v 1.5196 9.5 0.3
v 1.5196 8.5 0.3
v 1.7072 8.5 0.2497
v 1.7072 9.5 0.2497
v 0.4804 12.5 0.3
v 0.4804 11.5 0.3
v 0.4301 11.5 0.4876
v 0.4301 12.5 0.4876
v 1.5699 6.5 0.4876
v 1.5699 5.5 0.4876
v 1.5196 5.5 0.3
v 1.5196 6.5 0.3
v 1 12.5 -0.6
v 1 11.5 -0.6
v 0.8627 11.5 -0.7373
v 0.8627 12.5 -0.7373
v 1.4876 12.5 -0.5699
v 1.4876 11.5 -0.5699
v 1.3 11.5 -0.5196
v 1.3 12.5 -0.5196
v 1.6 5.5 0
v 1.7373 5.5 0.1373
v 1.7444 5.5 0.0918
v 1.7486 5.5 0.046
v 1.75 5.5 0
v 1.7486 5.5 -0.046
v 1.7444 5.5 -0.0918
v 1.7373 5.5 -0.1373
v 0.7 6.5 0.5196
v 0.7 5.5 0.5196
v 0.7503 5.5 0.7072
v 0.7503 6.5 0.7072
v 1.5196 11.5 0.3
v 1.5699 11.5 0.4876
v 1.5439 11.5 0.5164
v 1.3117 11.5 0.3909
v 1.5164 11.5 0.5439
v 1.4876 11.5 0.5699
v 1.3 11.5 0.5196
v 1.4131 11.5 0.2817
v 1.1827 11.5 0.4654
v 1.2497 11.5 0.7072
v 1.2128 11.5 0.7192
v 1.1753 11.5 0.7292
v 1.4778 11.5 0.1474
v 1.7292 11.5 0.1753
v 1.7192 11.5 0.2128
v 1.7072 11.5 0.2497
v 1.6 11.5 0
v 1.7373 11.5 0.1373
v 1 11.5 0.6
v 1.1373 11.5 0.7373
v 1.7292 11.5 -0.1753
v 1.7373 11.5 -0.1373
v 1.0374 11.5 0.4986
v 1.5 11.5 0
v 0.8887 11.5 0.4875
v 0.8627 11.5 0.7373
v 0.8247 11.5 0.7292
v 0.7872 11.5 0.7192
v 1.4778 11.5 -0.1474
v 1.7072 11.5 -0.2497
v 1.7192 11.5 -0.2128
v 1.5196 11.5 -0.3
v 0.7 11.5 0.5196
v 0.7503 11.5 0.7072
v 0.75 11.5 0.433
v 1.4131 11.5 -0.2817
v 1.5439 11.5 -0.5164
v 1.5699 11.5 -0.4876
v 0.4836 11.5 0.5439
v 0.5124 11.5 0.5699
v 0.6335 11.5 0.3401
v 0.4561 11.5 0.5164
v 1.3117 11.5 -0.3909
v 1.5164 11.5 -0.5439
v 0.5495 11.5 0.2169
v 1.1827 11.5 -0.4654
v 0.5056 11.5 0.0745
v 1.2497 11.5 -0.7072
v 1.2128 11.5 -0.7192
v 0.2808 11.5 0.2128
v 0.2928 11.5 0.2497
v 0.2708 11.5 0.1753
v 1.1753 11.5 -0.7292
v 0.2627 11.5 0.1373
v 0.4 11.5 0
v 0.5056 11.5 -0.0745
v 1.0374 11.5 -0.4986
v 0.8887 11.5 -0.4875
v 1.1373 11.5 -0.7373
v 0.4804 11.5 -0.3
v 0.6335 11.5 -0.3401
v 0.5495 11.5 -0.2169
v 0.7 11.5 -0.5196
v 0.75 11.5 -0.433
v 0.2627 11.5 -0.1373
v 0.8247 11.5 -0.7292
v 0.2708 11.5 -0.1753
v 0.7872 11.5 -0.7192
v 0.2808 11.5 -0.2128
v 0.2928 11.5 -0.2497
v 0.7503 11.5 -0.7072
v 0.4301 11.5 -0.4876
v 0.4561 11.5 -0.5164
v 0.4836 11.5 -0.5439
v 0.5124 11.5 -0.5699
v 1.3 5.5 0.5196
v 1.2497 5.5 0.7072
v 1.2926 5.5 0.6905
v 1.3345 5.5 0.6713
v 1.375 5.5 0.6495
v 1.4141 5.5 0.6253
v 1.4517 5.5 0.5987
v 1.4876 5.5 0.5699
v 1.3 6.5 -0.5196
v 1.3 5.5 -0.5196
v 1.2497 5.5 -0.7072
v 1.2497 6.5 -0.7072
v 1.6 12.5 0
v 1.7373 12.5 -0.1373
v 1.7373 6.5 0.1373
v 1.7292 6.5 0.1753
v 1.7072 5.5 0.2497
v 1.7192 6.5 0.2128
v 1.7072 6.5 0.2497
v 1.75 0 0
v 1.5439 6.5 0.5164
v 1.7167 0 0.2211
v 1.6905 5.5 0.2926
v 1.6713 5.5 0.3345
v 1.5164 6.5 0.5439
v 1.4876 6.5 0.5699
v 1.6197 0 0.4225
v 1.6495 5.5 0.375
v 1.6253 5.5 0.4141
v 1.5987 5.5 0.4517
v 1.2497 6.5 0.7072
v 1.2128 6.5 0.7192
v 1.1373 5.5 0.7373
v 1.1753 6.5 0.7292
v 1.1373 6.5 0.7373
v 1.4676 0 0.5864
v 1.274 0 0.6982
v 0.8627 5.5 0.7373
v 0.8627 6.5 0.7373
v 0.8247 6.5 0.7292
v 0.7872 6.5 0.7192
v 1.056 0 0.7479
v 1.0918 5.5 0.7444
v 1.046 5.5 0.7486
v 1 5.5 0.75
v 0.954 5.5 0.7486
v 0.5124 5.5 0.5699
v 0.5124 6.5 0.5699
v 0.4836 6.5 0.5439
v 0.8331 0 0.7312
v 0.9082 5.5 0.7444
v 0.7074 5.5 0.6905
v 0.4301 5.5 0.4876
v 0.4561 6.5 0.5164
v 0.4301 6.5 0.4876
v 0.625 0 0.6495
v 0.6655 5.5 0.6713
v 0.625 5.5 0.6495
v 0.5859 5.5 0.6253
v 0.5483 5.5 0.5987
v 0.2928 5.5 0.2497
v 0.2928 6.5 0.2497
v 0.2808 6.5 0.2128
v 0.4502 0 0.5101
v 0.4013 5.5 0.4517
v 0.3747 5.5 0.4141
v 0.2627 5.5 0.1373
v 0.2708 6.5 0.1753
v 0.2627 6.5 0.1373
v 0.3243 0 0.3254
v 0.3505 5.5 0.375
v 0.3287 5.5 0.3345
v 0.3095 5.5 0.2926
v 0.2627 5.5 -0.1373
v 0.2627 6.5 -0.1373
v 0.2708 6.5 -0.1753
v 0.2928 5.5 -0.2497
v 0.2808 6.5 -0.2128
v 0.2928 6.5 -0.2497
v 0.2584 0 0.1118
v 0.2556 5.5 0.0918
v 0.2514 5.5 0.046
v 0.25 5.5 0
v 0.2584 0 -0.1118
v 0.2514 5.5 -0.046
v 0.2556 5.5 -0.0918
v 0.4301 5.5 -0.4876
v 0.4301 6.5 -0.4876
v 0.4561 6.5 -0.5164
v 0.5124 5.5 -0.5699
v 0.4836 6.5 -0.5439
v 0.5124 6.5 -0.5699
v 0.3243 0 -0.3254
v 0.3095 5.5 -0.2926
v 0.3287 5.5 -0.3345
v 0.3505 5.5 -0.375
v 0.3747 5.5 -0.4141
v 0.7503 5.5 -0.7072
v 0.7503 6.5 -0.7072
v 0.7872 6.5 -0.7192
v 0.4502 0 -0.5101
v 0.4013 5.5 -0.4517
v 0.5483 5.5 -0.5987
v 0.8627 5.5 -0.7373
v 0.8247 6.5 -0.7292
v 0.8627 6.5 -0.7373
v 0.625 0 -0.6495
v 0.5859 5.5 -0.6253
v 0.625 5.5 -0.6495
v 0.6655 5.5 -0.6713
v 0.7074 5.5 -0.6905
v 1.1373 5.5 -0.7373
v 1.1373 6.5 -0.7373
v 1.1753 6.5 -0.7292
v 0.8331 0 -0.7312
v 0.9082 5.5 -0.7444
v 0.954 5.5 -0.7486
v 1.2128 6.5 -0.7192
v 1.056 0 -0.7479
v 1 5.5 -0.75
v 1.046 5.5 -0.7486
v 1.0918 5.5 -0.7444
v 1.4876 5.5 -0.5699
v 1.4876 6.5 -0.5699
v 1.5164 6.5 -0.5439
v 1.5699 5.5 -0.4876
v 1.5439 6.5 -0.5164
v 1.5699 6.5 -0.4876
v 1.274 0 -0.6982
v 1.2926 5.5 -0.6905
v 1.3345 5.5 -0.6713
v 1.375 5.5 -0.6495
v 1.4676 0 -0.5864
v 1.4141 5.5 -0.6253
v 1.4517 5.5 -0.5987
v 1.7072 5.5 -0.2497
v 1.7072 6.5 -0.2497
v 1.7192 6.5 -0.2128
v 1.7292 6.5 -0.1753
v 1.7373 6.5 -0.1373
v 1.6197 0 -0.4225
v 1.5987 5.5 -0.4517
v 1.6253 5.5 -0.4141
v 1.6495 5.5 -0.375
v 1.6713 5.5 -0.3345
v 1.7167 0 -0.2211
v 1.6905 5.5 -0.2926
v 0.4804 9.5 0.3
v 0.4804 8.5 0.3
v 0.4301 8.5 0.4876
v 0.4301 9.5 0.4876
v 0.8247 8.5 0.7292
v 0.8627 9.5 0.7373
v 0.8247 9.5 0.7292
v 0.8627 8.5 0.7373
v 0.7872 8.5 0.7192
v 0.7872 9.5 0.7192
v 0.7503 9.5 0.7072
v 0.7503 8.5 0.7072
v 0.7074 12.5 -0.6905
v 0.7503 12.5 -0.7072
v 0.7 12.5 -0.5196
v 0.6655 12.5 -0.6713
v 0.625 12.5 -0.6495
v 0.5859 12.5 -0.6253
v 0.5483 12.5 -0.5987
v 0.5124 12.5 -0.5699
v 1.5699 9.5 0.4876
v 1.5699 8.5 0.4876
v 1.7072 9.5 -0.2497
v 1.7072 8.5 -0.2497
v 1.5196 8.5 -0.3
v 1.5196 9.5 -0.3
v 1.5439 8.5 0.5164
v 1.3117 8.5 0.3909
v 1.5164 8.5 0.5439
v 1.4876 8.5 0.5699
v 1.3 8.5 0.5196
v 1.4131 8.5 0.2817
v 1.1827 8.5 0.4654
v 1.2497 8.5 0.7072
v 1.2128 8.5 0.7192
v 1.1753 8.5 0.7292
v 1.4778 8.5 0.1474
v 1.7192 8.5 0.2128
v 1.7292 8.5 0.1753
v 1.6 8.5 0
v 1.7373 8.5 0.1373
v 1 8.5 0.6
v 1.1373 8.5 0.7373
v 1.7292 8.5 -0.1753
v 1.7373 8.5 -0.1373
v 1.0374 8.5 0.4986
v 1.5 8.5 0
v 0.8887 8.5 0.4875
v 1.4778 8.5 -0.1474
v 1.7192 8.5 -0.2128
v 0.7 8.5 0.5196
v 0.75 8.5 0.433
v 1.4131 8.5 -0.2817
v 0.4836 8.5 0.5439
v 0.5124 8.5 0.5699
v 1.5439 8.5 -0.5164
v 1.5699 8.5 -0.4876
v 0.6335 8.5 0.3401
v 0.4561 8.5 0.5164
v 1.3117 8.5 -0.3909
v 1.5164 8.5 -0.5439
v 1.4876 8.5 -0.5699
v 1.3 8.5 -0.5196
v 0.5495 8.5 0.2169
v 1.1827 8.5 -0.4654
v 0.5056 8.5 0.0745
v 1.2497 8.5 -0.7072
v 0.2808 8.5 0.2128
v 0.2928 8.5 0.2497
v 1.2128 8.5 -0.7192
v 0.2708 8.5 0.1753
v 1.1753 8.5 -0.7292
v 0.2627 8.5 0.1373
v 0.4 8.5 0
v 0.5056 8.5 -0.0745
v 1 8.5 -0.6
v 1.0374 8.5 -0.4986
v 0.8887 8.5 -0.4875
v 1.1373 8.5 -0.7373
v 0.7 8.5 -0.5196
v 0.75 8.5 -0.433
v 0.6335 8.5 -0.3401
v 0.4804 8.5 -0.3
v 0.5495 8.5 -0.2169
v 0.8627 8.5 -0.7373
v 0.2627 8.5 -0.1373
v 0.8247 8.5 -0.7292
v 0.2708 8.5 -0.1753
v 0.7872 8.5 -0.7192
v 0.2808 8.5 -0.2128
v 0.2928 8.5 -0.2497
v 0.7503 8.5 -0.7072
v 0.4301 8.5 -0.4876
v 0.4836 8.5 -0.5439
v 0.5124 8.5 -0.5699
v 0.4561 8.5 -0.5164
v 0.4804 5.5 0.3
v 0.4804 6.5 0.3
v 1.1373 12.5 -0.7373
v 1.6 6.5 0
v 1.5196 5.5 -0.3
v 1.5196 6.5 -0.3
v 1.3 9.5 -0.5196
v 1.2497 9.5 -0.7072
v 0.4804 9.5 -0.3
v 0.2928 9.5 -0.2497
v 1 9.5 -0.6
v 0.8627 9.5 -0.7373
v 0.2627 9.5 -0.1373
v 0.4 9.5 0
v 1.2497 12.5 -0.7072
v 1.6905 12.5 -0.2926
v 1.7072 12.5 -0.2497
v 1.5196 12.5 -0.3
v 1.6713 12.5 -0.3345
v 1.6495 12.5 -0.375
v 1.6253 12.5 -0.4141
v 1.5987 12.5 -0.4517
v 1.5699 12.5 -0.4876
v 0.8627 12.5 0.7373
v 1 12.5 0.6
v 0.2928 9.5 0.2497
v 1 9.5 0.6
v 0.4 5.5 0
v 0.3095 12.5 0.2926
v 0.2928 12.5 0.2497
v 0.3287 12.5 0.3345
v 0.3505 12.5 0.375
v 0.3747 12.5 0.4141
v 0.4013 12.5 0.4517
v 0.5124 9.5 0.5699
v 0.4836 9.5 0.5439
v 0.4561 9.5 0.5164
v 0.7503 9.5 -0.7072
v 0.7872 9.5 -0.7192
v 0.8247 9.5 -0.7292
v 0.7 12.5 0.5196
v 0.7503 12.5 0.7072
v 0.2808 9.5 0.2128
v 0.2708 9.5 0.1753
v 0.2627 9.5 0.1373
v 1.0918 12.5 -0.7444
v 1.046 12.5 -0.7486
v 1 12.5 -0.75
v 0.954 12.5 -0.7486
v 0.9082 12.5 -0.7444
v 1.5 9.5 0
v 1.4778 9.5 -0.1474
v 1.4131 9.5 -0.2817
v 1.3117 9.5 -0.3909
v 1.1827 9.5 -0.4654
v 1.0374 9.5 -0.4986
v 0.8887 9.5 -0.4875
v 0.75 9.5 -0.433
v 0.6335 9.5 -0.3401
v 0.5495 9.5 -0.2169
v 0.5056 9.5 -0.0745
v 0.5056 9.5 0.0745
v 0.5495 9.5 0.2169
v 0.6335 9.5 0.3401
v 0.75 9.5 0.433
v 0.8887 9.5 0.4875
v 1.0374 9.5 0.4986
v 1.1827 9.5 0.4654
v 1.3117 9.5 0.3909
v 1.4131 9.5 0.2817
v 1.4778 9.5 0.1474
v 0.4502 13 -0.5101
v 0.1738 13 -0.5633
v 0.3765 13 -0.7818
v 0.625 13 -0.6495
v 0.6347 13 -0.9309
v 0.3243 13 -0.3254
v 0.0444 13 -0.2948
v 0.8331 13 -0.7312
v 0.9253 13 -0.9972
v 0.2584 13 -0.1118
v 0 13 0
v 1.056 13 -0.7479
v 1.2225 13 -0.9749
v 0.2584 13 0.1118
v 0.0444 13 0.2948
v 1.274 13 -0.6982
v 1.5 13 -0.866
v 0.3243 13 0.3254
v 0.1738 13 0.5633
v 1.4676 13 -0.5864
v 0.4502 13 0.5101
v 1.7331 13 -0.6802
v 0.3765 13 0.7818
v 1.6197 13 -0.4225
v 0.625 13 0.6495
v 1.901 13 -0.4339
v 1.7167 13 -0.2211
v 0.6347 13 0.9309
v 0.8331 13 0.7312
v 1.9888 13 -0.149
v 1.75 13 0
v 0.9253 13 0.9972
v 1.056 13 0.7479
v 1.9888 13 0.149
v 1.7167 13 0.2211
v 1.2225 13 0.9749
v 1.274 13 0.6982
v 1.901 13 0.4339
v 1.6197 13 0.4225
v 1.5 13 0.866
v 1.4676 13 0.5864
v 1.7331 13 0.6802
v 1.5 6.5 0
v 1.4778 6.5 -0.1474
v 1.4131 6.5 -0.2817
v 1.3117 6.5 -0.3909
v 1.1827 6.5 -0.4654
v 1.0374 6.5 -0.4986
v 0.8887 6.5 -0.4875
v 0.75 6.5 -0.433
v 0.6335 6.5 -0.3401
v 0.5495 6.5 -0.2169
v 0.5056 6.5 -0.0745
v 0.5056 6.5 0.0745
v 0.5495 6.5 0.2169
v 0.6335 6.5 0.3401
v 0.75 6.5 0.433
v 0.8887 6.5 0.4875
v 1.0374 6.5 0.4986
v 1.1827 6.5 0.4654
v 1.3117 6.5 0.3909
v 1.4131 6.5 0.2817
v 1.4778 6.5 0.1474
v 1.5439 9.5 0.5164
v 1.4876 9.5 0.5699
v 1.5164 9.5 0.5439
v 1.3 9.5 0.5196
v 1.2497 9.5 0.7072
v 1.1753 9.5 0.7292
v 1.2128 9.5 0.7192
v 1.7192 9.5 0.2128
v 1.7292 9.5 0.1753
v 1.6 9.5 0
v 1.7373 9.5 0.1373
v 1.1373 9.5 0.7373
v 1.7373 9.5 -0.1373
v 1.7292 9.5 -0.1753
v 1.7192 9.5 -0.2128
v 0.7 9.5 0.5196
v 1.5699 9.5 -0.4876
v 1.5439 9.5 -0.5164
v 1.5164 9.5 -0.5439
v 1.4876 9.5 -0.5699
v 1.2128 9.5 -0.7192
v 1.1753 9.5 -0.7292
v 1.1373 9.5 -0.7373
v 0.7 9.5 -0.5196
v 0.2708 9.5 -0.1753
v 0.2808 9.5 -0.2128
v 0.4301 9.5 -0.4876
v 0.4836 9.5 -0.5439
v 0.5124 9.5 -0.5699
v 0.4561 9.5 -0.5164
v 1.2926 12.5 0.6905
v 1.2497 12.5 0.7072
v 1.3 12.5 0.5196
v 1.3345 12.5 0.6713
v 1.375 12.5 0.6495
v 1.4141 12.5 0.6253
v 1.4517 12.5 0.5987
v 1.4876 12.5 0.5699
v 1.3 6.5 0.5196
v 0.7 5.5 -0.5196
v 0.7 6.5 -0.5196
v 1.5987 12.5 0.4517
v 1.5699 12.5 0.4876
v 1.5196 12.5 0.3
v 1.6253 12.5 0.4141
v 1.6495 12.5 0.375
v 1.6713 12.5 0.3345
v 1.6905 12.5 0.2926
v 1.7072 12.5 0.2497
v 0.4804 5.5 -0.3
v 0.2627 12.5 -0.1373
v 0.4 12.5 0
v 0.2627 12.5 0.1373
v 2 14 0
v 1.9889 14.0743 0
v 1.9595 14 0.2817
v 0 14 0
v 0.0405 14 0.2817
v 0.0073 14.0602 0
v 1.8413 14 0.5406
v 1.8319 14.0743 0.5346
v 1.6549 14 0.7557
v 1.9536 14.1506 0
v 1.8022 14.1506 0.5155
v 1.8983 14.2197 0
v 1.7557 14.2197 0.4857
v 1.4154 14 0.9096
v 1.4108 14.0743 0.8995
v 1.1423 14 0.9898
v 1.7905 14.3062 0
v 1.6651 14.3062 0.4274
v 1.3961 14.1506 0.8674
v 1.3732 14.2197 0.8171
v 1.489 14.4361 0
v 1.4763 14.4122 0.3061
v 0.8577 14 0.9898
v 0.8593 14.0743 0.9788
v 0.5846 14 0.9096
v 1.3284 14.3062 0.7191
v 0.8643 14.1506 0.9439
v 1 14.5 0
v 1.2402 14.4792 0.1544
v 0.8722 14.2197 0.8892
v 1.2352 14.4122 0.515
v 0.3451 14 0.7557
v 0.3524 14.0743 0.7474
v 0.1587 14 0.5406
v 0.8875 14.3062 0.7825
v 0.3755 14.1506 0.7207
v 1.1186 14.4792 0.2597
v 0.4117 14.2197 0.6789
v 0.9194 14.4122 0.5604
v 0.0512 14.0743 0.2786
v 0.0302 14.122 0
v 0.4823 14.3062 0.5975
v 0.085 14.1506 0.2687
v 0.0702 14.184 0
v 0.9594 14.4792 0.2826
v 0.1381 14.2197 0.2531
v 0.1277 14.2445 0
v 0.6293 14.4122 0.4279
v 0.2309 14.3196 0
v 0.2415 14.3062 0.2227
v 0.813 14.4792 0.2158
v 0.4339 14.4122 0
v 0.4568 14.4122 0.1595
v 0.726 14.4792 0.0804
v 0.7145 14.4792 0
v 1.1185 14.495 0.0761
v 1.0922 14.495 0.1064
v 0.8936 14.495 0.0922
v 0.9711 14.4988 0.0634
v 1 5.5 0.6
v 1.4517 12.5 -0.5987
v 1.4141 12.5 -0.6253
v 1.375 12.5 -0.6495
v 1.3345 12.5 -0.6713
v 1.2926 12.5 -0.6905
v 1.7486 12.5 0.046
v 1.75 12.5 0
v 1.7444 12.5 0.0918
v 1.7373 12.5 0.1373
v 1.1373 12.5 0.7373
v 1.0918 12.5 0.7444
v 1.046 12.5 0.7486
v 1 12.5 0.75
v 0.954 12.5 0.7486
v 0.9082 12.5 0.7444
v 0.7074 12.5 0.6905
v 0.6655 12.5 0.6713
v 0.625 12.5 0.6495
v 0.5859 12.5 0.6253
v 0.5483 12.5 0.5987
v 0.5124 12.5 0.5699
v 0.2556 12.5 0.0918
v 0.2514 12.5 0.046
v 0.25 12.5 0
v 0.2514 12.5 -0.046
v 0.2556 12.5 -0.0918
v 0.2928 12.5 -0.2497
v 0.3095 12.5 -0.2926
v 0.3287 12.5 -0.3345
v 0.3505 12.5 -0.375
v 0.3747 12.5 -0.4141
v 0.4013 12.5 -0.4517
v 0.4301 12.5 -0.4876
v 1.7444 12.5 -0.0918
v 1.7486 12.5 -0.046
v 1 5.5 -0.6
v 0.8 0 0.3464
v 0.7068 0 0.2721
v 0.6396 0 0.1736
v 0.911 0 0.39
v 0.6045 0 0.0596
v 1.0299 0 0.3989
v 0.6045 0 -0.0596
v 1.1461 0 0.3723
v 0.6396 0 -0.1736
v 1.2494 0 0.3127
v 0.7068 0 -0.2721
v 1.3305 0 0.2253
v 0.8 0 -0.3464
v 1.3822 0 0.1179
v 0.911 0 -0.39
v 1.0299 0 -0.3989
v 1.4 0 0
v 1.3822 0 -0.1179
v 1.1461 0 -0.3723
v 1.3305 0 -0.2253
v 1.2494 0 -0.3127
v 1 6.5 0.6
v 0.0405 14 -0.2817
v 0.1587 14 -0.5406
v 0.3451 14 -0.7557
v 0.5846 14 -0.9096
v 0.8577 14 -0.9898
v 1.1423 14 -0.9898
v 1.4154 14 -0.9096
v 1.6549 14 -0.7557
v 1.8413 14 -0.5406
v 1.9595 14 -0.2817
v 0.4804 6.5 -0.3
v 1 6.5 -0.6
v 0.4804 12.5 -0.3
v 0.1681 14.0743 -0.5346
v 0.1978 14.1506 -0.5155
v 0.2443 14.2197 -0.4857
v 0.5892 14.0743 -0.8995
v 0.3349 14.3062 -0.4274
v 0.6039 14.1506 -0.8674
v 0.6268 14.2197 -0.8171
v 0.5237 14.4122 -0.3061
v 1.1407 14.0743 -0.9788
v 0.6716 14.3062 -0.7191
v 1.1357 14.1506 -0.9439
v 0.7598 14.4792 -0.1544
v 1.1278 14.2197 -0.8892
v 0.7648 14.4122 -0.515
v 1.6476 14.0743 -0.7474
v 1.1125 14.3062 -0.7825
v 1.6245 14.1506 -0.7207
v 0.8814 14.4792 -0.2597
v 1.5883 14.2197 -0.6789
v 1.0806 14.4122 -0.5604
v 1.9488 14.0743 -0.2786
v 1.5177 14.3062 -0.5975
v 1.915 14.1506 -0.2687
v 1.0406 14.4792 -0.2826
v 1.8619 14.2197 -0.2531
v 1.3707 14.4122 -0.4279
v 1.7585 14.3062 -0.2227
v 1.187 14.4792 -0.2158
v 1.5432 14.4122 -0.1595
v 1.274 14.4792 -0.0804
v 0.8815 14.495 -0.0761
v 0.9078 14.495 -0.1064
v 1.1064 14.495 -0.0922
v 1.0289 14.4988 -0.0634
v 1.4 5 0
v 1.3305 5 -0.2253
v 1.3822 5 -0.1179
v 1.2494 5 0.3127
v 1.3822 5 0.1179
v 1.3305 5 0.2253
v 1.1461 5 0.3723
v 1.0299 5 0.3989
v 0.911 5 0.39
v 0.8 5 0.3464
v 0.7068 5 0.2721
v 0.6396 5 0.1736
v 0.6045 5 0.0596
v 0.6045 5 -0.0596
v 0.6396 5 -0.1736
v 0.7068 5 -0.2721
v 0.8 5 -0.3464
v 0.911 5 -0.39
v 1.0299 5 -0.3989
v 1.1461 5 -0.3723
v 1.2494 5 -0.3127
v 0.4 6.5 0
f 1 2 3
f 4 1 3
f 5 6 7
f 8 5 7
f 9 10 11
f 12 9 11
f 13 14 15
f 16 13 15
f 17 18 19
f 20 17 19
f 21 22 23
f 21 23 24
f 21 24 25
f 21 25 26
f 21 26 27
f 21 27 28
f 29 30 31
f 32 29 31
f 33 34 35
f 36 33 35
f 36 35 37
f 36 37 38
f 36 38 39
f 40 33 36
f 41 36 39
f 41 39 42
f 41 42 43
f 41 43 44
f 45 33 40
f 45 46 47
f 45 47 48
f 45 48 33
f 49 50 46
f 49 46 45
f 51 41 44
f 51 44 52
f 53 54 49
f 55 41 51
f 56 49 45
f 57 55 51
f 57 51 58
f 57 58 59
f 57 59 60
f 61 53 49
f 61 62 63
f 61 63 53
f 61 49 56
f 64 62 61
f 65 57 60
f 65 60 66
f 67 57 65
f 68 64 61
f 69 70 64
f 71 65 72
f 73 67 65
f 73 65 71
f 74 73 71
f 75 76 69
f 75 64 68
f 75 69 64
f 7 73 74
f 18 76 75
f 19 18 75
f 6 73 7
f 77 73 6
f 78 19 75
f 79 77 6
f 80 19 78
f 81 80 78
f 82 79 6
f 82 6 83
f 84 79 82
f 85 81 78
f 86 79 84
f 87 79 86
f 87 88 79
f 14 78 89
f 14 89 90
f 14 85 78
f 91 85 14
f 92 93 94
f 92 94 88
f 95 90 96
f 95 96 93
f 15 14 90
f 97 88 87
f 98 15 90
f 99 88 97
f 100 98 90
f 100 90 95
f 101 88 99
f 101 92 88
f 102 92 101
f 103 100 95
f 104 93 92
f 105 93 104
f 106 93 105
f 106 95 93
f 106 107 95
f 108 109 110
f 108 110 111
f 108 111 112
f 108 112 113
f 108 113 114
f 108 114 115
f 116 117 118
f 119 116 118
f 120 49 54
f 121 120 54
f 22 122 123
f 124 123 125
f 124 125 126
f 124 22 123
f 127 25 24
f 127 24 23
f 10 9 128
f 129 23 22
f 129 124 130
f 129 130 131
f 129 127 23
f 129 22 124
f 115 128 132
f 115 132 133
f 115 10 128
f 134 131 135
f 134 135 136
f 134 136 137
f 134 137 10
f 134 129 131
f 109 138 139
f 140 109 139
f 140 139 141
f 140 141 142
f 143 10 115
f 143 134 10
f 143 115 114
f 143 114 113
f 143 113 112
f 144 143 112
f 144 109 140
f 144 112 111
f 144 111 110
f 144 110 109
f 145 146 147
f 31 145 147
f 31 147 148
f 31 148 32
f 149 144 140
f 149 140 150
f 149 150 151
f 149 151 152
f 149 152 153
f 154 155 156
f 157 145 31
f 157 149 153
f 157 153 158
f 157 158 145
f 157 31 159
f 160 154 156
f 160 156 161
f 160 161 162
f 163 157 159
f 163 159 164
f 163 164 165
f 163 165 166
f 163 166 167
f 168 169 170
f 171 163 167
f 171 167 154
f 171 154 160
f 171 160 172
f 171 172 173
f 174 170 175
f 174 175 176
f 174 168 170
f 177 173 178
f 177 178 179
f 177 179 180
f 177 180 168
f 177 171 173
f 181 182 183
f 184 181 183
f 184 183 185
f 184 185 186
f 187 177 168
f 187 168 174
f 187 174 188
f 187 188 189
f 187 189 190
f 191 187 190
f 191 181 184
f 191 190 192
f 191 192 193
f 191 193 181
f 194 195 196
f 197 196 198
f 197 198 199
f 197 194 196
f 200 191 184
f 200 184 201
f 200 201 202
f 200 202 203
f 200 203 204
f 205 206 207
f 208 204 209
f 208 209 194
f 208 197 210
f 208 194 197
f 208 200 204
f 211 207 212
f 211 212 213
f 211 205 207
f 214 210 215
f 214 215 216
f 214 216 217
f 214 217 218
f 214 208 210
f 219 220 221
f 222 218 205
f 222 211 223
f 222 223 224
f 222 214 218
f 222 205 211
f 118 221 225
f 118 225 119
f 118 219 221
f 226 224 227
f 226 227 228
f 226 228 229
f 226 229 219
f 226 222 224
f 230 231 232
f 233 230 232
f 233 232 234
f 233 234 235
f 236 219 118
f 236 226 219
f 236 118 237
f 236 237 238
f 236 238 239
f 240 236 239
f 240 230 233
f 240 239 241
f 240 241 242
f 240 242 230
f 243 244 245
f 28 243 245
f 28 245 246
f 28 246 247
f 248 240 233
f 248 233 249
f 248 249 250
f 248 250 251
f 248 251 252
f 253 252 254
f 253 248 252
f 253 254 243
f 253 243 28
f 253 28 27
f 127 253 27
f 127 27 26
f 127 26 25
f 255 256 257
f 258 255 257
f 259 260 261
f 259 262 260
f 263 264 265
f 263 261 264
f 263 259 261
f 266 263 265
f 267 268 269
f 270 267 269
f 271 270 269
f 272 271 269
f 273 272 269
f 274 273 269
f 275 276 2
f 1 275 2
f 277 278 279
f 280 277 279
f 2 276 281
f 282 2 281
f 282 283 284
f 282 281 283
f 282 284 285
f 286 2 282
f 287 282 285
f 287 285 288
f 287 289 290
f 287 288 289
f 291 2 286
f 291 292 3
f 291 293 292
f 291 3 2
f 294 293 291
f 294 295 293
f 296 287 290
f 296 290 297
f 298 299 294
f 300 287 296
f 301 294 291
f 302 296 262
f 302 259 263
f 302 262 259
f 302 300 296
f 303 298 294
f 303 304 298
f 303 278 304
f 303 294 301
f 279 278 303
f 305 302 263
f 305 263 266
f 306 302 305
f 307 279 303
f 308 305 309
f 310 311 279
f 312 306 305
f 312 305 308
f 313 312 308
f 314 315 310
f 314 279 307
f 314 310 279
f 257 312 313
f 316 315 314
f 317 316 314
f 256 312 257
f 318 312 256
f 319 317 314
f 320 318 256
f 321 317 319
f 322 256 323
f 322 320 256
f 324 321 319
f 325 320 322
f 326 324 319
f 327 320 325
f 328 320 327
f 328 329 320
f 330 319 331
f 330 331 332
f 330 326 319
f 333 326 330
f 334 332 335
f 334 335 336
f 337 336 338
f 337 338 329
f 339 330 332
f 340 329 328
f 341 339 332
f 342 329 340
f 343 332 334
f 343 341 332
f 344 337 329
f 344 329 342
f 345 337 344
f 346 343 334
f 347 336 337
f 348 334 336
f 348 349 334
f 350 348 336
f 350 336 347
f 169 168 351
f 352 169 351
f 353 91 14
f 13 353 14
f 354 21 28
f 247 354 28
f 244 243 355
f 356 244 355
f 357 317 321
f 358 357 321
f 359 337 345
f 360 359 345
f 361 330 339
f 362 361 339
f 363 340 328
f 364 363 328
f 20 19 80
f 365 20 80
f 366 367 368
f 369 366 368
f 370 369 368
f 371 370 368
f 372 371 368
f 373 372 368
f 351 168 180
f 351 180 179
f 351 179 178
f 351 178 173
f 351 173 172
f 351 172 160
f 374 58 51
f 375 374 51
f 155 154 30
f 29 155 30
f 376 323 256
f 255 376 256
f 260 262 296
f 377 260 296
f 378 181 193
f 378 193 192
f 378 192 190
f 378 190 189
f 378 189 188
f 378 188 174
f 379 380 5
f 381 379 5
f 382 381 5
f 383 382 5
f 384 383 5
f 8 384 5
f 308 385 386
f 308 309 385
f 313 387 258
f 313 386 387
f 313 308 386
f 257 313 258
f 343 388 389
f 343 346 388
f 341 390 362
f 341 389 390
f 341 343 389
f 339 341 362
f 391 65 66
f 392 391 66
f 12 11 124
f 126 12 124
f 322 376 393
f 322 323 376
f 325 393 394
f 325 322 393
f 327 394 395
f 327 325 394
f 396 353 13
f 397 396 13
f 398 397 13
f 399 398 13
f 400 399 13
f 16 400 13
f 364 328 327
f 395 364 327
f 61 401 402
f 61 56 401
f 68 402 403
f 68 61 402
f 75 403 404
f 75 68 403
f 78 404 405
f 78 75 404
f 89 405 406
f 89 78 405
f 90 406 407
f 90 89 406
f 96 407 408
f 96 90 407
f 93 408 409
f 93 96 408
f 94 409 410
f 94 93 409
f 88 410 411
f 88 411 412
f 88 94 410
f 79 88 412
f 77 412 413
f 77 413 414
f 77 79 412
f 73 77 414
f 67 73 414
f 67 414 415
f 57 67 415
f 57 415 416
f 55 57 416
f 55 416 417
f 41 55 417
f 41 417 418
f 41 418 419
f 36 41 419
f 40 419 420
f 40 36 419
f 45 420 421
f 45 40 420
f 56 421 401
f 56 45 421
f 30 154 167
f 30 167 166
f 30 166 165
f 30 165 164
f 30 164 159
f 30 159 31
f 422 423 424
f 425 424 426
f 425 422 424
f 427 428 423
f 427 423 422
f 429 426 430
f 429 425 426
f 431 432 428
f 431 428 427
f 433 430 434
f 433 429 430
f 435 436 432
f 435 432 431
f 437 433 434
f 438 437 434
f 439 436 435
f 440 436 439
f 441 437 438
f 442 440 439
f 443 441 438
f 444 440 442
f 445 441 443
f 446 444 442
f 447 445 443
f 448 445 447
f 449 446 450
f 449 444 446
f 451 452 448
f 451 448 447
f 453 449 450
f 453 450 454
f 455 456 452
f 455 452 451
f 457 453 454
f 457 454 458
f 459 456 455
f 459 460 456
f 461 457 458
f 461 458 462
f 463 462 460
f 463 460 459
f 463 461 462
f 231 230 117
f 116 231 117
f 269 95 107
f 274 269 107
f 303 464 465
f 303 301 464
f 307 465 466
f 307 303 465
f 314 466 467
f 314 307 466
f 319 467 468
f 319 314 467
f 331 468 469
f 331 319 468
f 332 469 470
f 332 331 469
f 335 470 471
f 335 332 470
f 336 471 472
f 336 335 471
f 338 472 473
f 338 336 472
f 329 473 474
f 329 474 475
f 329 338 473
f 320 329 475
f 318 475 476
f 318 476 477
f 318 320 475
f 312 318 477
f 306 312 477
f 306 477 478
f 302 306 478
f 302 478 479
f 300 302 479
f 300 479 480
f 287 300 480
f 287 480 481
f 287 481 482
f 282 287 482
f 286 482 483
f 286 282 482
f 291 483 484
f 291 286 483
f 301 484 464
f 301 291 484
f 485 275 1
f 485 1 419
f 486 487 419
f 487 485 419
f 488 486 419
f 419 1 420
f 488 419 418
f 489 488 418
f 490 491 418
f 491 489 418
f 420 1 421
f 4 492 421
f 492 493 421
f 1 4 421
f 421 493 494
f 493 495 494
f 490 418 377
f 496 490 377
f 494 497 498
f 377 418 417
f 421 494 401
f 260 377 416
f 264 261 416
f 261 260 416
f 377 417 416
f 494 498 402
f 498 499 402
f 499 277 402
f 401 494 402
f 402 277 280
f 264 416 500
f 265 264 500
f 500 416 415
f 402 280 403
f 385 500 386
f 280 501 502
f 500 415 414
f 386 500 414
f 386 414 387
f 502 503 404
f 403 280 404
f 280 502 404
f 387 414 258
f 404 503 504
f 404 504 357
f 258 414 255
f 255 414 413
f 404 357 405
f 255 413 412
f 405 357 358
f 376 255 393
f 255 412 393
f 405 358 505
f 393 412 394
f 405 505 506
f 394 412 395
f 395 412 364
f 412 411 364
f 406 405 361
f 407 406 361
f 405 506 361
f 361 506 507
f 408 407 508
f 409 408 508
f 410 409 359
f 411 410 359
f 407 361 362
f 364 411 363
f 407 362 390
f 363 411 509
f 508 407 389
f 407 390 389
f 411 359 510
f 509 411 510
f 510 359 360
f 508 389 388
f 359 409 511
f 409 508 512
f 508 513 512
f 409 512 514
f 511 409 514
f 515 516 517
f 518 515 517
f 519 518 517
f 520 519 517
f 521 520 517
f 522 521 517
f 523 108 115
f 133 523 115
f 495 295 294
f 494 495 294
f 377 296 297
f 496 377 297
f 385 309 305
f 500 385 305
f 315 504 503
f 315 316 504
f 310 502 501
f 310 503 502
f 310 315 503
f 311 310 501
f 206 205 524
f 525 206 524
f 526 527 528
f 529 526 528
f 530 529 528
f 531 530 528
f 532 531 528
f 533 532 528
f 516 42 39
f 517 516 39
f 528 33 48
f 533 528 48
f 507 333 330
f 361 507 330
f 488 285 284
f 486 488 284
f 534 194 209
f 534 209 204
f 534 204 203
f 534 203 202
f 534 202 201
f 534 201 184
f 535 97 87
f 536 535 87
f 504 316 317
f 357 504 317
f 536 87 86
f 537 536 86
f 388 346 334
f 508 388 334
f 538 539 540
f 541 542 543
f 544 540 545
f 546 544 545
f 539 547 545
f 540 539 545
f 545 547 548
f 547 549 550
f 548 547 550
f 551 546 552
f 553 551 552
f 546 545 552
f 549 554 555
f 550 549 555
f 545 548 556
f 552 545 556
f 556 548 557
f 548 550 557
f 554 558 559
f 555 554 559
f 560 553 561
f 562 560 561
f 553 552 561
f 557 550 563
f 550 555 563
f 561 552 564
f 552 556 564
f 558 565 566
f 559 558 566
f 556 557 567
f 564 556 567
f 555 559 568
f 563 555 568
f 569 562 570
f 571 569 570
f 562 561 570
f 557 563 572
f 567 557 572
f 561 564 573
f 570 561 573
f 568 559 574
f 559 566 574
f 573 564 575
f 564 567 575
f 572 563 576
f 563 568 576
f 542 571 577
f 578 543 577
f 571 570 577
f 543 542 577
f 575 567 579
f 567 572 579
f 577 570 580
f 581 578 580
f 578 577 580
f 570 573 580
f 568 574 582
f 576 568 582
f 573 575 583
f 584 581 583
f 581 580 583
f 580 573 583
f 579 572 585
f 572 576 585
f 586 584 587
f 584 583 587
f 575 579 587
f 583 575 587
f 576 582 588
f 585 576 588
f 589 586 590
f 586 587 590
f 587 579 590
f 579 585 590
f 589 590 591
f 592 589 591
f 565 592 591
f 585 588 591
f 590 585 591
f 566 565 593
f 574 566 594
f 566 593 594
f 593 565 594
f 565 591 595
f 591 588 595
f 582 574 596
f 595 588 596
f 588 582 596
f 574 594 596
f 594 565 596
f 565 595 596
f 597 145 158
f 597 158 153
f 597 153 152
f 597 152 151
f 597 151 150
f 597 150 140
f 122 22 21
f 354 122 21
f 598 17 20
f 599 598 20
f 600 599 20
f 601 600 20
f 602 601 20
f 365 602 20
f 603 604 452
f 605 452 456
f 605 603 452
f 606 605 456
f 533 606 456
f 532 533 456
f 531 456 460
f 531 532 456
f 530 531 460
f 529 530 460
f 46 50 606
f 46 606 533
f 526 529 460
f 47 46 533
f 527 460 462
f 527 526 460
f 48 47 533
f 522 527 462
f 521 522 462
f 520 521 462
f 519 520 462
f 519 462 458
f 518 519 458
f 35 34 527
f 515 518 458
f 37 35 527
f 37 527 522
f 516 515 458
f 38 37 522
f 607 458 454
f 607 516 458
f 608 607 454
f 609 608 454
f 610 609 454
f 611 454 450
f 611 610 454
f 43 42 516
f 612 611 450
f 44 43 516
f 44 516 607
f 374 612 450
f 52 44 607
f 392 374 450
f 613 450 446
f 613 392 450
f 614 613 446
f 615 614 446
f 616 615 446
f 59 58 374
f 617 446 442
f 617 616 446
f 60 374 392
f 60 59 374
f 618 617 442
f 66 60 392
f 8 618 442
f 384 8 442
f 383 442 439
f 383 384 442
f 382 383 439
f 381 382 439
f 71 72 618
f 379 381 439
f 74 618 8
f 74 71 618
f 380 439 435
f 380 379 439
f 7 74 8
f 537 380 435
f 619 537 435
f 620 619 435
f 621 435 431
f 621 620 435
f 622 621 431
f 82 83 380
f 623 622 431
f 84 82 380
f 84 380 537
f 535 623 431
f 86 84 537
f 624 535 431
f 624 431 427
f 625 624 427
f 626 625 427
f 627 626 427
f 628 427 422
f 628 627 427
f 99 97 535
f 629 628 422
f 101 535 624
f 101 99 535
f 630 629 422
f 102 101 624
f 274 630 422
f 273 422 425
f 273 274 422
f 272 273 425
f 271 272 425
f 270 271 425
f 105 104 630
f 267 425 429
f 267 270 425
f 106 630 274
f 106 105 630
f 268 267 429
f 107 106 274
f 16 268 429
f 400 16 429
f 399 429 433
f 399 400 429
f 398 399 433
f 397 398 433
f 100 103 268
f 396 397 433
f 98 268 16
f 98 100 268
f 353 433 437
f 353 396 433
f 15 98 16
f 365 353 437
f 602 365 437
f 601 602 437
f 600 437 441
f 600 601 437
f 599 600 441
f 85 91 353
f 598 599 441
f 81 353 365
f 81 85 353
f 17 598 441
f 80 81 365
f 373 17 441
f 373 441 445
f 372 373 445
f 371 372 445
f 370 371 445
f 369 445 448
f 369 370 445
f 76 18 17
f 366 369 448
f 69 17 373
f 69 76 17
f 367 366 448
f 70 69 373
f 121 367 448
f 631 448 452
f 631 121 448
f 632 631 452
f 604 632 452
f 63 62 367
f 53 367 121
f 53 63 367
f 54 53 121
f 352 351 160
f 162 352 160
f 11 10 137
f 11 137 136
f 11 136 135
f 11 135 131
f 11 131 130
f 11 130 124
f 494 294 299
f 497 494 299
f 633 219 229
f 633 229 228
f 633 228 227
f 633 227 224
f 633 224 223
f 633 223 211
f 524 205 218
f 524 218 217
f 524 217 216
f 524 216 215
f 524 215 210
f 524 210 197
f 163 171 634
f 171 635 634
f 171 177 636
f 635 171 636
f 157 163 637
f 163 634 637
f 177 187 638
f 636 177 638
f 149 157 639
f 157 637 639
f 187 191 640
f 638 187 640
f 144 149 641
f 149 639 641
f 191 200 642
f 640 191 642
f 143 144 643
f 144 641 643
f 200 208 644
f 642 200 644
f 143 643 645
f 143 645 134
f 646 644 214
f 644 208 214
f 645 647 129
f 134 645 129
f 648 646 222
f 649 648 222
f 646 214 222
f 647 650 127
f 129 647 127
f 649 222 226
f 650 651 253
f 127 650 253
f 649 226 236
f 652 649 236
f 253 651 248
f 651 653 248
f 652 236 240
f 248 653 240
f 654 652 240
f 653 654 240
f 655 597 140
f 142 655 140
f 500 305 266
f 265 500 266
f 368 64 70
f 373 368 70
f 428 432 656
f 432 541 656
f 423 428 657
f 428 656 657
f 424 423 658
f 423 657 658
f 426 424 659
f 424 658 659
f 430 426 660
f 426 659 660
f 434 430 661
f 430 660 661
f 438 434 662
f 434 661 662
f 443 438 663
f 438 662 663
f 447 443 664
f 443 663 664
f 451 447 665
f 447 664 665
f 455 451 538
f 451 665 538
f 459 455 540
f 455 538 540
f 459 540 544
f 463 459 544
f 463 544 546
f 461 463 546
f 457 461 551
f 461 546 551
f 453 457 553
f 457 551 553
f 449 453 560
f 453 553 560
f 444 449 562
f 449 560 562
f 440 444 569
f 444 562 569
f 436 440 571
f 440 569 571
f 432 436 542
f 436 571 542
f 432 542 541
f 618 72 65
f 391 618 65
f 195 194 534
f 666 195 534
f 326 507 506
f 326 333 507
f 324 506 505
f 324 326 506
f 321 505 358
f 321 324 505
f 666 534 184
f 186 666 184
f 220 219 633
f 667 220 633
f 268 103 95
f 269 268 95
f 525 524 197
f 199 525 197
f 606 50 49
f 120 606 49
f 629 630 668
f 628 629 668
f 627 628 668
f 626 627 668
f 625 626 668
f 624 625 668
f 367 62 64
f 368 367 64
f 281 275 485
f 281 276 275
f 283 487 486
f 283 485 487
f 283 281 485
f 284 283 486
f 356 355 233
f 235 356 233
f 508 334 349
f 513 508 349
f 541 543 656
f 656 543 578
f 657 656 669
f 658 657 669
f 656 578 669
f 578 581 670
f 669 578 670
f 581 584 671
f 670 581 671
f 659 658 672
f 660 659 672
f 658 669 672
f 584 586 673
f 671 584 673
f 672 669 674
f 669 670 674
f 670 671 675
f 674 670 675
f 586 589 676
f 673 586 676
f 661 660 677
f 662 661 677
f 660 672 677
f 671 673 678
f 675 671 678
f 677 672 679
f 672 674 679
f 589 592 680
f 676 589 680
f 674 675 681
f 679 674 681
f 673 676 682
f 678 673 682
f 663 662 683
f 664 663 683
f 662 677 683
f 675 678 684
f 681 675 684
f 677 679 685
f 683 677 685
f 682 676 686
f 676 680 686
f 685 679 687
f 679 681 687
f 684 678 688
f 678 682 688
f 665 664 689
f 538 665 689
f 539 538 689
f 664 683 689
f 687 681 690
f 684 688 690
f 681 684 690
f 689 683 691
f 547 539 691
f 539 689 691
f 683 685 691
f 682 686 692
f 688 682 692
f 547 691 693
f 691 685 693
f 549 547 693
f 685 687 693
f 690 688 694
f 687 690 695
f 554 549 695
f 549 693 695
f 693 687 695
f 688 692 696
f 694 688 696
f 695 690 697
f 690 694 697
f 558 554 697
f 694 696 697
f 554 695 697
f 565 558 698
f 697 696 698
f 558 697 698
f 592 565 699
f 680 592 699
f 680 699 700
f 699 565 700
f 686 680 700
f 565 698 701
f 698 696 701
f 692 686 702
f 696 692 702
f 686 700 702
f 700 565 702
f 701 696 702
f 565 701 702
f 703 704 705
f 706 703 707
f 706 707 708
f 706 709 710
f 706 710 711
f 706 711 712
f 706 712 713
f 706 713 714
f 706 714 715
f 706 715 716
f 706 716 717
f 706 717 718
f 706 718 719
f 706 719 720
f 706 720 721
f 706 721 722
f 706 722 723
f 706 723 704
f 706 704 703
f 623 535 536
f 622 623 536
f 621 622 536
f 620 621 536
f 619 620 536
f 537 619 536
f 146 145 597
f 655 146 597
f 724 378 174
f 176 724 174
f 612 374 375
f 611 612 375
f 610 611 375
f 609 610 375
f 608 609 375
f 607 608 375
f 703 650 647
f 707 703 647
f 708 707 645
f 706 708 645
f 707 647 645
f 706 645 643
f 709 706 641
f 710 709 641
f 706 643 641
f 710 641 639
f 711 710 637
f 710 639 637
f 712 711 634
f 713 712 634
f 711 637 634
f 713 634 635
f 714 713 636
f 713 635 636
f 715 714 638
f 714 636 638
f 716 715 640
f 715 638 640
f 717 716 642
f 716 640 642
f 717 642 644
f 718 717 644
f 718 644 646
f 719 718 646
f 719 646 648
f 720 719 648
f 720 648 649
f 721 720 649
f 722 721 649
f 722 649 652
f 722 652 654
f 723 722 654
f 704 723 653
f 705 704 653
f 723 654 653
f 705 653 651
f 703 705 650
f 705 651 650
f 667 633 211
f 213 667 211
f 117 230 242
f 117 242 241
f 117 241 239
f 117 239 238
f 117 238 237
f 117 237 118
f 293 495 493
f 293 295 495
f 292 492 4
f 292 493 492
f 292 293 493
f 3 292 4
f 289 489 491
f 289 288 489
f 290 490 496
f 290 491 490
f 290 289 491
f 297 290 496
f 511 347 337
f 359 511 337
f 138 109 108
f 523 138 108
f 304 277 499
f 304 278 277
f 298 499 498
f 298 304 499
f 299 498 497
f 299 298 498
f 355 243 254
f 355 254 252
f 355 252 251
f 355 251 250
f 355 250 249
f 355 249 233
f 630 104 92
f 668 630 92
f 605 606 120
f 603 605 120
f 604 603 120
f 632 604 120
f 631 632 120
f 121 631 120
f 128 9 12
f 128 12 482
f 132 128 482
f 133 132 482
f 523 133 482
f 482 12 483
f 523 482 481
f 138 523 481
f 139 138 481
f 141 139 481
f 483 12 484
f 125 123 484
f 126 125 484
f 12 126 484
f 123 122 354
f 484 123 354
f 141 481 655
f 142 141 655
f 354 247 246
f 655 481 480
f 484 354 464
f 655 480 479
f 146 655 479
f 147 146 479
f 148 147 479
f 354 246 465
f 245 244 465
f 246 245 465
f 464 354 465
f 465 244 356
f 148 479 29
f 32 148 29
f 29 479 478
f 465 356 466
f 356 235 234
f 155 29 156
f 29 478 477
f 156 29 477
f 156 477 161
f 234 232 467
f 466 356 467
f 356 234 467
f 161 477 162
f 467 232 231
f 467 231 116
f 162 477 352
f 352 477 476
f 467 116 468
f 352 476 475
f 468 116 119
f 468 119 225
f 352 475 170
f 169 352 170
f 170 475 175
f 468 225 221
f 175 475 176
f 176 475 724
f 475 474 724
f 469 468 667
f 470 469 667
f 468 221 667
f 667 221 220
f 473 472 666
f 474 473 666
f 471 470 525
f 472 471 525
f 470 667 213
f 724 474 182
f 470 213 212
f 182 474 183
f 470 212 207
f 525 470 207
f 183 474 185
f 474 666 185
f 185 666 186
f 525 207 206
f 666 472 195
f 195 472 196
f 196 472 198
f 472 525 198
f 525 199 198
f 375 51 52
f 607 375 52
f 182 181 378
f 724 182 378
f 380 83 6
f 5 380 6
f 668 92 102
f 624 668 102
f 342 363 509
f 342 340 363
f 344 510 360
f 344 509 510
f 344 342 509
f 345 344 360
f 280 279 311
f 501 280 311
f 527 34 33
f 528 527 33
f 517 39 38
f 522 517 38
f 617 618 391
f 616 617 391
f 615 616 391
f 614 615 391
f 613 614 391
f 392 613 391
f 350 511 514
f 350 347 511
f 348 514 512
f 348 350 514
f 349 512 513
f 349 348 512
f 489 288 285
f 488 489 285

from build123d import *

# Parameters (mm, degrees)
SKETCH_2_R                = 1.288183927
SKETCH_2_R_2              = 0.75
CUT_EXTRUDE_1_DEPTH       = 13
SKETCH_3_R                = 0.4
CUT_EXTRUDE_2_DEPTH       = 5
SKETCH_8_W                = 0.443463538
SKETCH_8_H                = 2
CUT_EXTRUDE_3_DEPTH       = 7
PATTERN_CIRCULAR_13_COUNT = 12


with BuildPart() as part:
    # 草图1 → 旋转1 (revolve)
    with BuildSketch(Plane.XY):
        with BuildLine():
            Line((1, 0), (2, 0))
            Line((2, 0), (2, 14))
            add(Edge.make_bspline(
                [(2, 14), (2, 14.5), (1, 14.5)],
                knots=[0, 0, 0, 1.570796327, 1.570796327, 1.570796327], degree=2, weights=[1, 0.707106781, 1]))
            Line((1, 14.5), (1, 0))
        make_face()
    revolve(axis=Axis((1, 20.110661338, 0), (0, -1, 0)))

    # 草图2 → 切除-拉伸1 (cut)
    with BuildSketch(Plane.XZ):
        with Locations((1, 0)):
            Circle(SKETCH_2_R)
        with Locations((1, 0)):
            Circle(SKETCH_2_R_2, mode=Mode.SUBTRACT)
    extrude(amount=-CUT_EXTRUDE_1_DEPTH, mode=Mode.SUBTRACT)

    # 草图3 → 切除-拉伸2 (cut)
    with BuildSketch(Plane(origin=(0, 0, 0), x_dir=(-1, 0, 0), z_dir=(0, -1, 0))):
        with Locations((-1, 0)):
            Circle(SKETCH_3_R)
    extrude(amount=-CUT_EXTRUDE_2_DEPTH, mode=Mode.SUBTRACT)

    # 草图8 → 切除-旋转1 (revolve, cut)
    with BuildSketch(Plane.XY):
        with Locations((1.721731769, 10.5)):
            Rectangle(SKETCH_8_W, SKETCH_8_H)
        with Locations((1.721731769, 7.5)):
            Rectangle(SKETCH_8_W, SKETCH_8_H)
    revolve(axis=Axis((1, 0, 0), (0, 1, 0)), mode=Mode.SUBTRACT)

    # 草图9 → 切除-拉伸3 (cut)
    with BuildSketch(Plane(origin=(0, 5.5, 0), x_dir=(-1, 0, 0), z_dir=(0, -1, 0))):
        with BuildLine():
            Line((-1.137321392, 0.737321392), (-1, 0.6))
            Line((-1, 0.6), (-0.862678608, 0.737321392))
            ThreePointArc((-0.862678608, 0.737321392), (-1, 0.75), (-1.137321392, 0.737321392))
        make_face()
    cut_extrude_3 = extrude(amount=-CUT_EXTRUDE_3_DEPTH, mode=Mode.SUBTRACT)

    # 阵列(圆周)13: 切除-拉伸3 ×12 about axis
    pattern_circular_13_axis = Axis((1, 13, 0), (0, -1, 0))
    for i in range(1, PATTERN_CIRCULAR_13_COUNT):
        add(cut_extrude_3.rotate(pattern_circular_13_axis, i * 360 / PATTERN_CIRCULAR_13_COUNT), mode=Mode.SUBTRACT)


solid = part.part
